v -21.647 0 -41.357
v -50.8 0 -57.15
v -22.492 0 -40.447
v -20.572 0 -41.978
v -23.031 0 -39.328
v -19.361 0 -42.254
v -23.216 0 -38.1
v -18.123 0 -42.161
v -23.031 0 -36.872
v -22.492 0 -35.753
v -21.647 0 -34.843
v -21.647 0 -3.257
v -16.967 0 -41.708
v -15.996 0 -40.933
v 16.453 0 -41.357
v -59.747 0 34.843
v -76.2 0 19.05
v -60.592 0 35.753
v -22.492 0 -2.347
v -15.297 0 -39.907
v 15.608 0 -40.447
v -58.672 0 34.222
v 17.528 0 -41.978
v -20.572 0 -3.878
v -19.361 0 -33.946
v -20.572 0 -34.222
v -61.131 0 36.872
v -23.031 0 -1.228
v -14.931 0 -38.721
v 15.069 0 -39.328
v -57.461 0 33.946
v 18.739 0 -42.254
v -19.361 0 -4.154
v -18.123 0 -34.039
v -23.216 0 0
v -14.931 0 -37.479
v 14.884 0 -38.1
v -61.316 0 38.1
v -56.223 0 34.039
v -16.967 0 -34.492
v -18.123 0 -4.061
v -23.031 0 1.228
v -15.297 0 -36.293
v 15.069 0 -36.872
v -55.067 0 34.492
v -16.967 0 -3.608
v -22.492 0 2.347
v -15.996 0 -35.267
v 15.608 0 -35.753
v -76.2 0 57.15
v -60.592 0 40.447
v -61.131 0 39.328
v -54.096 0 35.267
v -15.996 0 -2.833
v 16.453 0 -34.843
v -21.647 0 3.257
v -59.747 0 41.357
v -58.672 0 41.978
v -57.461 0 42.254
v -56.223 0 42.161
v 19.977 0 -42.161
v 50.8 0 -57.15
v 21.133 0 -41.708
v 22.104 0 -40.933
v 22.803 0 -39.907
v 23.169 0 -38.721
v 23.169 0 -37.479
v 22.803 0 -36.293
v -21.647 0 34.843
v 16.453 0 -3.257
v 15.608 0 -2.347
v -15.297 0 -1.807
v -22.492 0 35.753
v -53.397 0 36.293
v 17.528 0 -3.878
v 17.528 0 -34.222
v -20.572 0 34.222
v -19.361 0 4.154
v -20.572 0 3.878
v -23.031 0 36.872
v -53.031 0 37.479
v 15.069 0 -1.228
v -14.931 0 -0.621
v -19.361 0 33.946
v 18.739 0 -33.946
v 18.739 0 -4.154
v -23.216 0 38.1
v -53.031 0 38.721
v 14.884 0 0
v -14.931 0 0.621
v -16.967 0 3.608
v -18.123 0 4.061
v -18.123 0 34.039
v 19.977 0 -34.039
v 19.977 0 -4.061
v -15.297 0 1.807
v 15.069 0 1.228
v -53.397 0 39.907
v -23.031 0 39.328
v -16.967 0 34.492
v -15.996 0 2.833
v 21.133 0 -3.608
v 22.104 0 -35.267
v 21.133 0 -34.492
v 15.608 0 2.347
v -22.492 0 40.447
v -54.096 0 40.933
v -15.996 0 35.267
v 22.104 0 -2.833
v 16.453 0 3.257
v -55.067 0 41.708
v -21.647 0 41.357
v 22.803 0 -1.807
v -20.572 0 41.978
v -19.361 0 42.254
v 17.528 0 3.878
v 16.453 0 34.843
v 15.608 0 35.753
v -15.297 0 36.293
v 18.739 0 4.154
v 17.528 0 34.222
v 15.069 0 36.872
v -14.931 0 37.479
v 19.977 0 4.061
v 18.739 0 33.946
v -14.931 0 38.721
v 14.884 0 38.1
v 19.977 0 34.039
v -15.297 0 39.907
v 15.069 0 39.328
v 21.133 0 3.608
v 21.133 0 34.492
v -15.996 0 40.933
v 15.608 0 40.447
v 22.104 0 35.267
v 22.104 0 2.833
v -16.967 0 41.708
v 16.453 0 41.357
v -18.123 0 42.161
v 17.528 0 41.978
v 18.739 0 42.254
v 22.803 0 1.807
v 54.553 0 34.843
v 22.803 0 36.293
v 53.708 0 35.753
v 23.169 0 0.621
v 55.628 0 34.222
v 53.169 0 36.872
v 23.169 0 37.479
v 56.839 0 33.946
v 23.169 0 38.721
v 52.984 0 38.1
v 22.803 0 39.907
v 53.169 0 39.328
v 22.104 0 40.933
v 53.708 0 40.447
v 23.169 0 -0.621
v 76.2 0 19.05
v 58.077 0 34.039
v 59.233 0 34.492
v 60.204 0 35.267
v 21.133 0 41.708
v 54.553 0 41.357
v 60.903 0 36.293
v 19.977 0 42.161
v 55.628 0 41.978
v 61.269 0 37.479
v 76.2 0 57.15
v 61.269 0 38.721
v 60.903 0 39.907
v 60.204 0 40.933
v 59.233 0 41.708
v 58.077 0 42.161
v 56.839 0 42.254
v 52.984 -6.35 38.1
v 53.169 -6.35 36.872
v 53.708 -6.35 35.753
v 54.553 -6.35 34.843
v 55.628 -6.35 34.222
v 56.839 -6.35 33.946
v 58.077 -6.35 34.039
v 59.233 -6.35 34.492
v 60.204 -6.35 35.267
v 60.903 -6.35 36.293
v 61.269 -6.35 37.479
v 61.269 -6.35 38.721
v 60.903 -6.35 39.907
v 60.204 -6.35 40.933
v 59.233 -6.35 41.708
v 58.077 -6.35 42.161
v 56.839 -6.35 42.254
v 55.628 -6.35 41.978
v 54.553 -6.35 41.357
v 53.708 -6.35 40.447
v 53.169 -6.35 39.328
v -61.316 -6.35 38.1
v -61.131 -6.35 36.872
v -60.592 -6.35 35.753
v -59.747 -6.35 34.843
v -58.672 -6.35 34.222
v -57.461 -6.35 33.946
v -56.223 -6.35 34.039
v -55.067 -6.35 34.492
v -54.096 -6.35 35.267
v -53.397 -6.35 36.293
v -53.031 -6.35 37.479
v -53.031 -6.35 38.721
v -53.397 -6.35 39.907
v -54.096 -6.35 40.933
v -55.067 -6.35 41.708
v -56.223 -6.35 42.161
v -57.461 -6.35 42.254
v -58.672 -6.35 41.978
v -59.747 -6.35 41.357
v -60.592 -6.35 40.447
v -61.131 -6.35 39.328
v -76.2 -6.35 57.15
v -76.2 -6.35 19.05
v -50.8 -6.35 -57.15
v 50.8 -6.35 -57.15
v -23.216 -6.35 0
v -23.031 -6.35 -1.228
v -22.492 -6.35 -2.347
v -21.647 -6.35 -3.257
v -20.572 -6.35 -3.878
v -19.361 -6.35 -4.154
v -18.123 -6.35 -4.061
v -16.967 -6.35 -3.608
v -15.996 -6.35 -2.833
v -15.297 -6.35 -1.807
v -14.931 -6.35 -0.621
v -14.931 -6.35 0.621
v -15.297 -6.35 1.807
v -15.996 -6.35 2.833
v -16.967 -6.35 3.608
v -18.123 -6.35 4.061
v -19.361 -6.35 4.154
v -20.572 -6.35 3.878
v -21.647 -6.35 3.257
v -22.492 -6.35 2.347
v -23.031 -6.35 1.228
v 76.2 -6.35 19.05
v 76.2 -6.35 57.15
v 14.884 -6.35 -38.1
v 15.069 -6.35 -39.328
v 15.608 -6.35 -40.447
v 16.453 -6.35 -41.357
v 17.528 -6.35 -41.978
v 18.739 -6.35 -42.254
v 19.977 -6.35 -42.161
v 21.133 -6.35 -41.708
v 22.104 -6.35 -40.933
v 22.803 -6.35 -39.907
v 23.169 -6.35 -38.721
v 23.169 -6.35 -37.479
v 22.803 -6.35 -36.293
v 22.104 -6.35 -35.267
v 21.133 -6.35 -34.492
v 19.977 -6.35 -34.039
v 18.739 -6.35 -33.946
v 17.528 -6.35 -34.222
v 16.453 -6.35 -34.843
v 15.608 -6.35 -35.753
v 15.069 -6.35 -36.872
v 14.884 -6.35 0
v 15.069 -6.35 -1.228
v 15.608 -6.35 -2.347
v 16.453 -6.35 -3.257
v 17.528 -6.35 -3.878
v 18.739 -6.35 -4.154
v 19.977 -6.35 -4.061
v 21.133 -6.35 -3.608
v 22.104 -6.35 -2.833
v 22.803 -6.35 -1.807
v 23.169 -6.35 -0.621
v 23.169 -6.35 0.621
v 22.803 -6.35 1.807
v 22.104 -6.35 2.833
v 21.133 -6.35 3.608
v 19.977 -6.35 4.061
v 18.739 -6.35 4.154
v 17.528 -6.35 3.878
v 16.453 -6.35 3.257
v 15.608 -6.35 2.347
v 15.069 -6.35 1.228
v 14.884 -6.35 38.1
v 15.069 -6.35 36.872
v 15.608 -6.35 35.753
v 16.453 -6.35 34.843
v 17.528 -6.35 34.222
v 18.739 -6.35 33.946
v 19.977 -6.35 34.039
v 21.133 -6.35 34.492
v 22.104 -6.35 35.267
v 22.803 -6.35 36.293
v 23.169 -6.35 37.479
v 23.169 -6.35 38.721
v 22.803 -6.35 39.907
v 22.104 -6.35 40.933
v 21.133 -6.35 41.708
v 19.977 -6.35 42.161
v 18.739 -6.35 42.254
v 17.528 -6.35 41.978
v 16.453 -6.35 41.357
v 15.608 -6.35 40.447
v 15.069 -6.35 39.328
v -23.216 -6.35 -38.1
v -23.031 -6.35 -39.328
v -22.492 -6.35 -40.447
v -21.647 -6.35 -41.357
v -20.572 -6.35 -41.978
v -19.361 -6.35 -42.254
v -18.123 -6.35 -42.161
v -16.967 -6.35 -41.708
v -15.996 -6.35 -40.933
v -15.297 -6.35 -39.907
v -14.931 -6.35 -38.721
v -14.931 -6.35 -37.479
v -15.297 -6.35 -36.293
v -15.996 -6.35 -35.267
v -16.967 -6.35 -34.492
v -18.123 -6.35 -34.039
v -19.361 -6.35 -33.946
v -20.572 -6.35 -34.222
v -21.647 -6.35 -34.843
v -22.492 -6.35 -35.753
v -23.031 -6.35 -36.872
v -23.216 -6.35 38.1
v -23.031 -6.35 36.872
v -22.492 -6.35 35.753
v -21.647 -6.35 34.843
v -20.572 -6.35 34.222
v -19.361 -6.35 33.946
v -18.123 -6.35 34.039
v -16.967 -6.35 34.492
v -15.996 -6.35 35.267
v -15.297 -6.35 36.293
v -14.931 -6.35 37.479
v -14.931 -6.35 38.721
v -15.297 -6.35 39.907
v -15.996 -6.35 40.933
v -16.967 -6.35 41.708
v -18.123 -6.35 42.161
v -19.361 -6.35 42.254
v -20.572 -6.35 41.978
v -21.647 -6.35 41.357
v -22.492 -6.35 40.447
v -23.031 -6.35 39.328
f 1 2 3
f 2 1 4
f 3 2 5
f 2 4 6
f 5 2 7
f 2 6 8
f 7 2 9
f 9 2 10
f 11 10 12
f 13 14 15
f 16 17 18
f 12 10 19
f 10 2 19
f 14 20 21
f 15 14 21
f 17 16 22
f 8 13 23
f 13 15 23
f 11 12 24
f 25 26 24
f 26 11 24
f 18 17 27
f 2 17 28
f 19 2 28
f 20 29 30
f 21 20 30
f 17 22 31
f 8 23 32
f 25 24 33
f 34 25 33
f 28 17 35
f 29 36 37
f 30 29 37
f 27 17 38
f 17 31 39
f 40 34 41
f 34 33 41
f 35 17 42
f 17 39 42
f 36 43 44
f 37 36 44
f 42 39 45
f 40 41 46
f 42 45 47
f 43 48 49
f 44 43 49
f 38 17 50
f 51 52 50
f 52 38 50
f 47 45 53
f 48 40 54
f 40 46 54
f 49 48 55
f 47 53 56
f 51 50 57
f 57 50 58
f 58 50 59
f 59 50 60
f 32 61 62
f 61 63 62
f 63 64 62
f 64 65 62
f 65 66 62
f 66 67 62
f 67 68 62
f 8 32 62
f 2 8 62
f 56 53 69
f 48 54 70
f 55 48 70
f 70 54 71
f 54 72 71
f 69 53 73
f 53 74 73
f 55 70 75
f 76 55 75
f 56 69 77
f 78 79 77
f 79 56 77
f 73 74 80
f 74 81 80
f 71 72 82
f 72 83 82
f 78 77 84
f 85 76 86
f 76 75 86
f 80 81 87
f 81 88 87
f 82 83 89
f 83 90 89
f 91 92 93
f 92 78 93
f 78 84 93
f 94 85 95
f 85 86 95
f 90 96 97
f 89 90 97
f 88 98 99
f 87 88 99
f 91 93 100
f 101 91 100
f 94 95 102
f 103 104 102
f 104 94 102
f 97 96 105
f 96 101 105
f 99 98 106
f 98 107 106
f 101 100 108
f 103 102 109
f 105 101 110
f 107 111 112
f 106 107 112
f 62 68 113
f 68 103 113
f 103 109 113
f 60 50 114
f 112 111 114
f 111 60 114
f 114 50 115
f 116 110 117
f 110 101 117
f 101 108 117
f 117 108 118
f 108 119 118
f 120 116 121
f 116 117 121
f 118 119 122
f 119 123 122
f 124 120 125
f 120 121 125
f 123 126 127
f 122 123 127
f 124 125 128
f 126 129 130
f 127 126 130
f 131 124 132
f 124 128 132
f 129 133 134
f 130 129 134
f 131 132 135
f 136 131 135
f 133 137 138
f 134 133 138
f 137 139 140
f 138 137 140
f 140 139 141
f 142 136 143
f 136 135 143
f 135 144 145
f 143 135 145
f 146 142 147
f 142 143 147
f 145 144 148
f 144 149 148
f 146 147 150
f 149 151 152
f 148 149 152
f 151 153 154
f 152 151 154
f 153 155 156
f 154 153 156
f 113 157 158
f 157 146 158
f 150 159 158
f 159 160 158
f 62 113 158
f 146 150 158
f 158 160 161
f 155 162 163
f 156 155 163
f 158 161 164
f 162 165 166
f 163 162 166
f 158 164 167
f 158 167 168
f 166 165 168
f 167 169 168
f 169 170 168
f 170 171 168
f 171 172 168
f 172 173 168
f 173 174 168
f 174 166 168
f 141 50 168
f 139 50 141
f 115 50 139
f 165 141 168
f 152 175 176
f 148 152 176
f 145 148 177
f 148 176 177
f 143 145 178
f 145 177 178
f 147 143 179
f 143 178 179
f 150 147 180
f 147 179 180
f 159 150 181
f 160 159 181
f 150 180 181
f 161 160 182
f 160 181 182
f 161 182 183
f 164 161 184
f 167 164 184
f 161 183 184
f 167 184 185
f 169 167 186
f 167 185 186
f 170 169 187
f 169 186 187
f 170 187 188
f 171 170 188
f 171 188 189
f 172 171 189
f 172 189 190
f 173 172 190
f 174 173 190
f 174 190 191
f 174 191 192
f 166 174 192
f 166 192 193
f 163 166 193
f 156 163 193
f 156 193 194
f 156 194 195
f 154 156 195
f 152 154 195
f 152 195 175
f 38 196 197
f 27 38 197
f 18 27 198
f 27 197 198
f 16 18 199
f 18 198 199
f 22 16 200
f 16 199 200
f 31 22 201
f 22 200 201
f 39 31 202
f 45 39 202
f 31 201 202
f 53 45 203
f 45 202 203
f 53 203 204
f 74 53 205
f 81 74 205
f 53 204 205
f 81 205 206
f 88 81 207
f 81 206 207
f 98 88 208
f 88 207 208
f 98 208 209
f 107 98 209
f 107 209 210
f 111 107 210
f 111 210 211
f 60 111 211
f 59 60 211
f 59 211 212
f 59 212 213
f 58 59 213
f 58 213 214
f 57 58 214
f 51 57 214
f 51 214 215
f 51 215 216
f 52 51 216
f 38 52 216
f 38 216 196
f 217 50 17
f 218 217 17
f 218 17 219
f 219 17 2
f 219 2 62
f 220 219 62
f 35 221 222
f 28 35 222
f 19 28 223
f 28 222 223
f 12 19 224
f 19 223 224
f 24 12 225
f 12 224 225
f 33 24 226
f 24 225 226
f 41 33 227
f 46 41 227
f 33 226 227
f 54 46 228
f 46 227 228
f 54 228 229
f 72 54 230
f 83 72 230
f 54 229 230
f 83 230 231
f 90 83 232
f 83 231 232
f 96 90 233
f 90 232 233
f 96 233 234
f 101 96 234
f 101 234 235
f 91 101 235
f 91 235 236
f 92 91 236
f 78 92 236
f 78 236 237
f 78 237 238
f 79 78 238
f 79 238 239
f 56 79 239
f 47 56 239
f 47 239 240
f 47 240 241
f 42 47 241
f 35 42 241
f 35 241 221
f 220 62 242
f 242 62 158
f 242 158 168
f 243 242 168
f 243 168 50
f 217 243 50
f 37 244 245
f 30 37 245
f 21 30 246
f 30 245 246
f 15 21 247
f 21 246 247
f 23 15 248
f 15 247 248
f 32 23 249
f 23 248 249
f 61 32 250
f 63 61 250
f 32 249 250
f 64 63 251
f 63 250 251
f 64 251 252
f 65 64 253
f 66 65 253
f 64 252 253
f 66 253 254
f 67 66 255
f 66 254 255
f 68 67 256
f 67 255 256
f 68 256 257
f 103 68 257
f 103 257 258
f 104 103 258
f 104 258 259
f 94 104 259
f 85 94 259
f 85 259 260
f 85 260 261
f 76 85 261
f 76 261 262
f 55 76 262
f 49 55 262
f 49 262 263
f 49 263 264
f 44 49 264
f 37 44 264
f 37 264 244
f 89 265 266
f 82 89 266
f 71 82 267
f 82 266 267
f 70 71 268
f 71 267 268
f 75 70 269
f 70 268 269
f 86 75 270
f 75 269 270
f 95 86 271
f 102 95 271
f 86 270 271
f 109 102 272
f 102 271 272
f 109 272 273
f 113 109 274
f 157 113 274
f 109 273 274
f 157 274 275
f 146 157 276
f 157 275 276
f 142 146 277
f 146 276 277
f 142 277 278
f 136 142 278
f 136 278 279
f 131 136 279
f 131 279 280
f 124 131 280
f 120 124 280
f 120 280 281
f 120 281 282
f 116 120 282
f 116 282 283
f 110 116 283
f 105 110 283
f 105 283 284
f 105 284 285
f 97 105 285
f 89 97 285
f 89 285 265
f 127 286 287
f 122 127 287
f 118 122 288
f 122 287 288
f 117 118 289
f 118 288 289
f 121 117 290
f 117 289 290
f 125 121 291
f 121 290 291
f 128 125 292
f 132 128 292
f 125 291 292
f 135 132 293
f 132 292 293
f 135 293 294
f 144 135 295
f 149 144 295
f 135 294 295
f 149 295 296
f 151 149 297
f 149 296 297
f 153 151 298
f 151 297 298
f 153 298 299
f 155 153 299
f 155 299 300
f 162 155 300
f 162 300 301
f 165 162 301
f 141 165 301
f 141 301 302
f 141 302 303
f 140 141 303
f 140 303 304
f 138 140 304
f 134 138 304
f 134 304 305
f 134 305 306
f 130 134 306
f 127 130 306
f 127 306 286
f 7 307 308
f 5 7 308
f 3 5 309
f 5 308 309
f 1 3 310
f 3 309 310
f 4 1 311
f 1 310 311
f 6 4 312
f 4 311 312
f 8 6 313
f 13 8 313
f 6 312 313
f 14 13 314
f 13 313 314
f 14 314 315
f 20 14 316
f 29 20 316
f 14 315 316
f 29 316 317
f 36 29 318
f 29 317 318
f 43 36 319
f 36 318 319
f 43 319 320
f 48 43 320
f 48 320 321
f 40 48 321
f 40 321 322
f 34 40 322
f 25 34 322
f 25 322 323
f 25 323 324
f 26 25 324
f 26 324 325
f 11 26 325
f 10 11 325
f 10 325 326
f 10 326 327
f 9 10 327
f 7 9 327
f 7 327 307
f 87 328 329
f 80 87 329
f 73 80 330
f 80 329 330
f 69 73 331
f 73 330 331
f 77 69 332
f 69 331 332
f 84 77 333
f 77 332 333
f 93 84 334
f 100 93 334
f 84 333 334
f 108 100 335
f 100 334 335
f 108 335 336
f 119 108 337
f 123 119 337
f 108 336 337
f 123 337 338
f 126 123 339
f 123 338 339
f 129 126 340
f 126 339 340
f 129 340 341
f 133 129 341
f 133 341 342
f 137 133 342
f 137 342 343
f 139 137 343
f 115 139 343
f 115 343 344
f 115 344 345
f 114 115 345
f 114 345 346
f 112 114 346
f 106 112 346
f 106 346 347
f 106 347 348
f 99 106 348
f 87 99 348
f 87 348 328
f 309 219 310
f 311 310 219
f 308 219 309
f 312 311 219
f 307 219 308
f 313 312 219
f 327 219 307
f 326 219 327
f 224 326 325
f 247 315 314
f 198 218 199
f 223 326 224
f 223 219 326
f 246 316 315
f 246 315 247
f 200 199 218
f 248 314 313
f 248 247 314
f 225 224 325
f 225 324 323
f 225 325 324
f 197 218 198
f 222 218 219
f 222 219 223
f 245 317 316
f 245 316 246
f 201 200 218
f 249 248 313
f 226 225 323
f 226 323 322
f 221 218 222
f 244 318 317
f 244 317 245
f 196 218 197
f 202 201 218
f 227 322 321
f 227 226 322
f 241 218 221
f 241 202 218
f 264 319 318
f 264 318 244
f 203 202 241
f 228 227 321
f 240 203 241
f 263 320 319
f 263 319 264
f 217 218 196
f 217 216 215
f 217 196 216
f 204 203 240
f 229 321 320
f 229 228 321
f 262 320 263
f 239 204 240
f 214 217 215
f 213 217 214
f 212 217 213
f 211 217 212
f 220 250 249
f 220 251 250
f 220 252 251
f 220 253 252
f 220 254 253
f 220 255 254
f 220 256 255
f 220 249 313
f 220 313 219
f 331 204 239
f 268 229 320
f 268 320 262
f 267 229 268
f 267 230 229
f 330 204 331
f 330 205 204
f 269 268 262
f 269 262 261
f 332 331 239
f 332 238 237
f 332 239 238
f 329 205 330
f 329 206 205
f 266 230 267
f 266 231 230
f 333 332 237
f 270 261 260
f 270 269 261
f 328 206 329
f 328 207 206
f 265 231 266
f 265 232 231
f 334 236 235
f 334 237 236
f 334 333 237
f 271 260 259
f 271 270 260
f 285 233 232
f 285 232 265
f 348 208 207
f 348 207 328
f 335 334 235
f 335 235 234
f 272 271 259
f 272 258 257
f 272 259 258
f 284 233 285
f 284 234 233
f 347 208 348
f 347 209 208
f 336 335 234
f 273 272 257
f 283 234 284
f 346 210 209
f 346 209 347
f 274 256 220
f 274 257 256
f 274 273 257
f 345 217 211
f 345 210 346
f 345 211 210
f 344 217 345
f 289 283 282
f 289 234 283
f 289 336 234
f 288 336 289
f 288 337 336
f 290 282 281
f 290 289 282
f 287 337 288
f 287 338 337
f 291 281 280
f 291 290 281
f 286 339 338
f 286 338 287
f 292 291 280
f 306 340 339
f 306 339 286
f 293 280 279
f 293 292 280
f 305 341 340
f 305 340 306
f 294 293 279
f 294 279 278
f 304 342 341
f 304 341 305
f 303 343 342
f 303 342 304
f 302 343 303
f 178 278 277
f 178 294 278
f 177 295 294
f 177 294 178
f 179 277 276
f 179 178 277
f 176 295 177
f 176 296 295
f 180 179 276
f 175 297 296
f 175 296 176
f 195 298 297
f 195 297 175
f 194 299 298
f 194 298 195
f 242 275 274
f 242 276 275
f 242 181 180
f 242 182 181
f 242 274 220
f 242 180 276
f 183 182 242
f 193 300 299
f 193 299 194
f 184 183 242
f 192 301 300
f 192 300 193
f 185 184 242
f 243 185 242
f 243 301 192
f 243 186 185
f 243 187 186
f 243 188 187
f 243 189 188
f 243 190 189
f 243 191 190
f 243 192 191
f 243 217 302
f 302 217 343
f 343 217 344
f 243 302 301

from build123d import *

# Parameters (mm, degrees)
F1_DEPTH = 6.35
F2_D     = 8.3312
F3_D     = 8.3312
F4_D     = 8.3312
F5_D     = 8.3312
F6_D     = 8.3312
F7_D     = 8.3312
F8_D     = 8.3312
F9_D     = 8.3312


with BuildPart() as f1:
    # F0 (on Front) → F1 (new body)
    with BuildSketch(Plane.XZ):
        Polygon((76.2, 57.15), (-76.2, 57.15), (-76.2, 19.05), (-50.8, -57.15), (50.8, -57.15), (76.2, 19.05), align=None)
    extrude(amount=F1_DEPTH)

    # F2 (through all)
    with Locations(Plane(origin=(0, 0, 0), x_dir=(1, 0, 0), z_dir=(0, 1, 0))):
        with Locations((57.15, -38.1)):
            Hole(F2_D / 2)

    # F3 (through all)
    with Locations(Plane(origin=(0, 0, 0), x_dir=(1, 0, 0), z_dir=(0, 1, 0))):
        with Locations((19.05, -38.1)):
            Hole(F3_D / 2)

    # F4 (through all)
    with Locations(Plane(origin=(0, 0, 0), x_dir=(1, 0, 0), z_dir=(0, 1, 0))):
        with Locations((-19.05, -38.1)):
            Hole(F4_D / 2)

    # F5 (through all)
    with Locations(Plane(origin=(0, 0, 0), x_dir=(1, 0, 0), z_dir=(0, 1, 0))):
        with Locations((-57.15, -38.1)):
            Hole(F5_D / 2)

    # F6 (through all)
    with Locations(Plane(origin=(0, 0, 0), x_dir=(1, 0, 0), z_dir=(0, 1, 0))):
        with Locations((-19.05, 0)):
            Hole(F6_D / 2)

    # F7 (through all)
    with Locations(Plane(origin=(0, 0, 0), x_dir=(1, 0, 0), z_dir=(0, 1, 0))):
        with Locations((19.05, 0)):
            Hole(F7_D / 2)

    # F8 (through all)
    with Locations(Plane(origin=(0, 0, 0), x_dir=(1, 0, 0), z_dir=(0, 1, 0))):
        with Locations((-19.05, 38.1)):
            Hole(F8_D / 2)

    # F9 (through all)
    with Locations(Plane(origin=(0, 0, 0), x_dir=(1, 0, 0), z_dir=(0, 1, 0))):
        with Locations((19.05, 38.1)):
            Hole(F9_D / 2)


solid = f1.part
